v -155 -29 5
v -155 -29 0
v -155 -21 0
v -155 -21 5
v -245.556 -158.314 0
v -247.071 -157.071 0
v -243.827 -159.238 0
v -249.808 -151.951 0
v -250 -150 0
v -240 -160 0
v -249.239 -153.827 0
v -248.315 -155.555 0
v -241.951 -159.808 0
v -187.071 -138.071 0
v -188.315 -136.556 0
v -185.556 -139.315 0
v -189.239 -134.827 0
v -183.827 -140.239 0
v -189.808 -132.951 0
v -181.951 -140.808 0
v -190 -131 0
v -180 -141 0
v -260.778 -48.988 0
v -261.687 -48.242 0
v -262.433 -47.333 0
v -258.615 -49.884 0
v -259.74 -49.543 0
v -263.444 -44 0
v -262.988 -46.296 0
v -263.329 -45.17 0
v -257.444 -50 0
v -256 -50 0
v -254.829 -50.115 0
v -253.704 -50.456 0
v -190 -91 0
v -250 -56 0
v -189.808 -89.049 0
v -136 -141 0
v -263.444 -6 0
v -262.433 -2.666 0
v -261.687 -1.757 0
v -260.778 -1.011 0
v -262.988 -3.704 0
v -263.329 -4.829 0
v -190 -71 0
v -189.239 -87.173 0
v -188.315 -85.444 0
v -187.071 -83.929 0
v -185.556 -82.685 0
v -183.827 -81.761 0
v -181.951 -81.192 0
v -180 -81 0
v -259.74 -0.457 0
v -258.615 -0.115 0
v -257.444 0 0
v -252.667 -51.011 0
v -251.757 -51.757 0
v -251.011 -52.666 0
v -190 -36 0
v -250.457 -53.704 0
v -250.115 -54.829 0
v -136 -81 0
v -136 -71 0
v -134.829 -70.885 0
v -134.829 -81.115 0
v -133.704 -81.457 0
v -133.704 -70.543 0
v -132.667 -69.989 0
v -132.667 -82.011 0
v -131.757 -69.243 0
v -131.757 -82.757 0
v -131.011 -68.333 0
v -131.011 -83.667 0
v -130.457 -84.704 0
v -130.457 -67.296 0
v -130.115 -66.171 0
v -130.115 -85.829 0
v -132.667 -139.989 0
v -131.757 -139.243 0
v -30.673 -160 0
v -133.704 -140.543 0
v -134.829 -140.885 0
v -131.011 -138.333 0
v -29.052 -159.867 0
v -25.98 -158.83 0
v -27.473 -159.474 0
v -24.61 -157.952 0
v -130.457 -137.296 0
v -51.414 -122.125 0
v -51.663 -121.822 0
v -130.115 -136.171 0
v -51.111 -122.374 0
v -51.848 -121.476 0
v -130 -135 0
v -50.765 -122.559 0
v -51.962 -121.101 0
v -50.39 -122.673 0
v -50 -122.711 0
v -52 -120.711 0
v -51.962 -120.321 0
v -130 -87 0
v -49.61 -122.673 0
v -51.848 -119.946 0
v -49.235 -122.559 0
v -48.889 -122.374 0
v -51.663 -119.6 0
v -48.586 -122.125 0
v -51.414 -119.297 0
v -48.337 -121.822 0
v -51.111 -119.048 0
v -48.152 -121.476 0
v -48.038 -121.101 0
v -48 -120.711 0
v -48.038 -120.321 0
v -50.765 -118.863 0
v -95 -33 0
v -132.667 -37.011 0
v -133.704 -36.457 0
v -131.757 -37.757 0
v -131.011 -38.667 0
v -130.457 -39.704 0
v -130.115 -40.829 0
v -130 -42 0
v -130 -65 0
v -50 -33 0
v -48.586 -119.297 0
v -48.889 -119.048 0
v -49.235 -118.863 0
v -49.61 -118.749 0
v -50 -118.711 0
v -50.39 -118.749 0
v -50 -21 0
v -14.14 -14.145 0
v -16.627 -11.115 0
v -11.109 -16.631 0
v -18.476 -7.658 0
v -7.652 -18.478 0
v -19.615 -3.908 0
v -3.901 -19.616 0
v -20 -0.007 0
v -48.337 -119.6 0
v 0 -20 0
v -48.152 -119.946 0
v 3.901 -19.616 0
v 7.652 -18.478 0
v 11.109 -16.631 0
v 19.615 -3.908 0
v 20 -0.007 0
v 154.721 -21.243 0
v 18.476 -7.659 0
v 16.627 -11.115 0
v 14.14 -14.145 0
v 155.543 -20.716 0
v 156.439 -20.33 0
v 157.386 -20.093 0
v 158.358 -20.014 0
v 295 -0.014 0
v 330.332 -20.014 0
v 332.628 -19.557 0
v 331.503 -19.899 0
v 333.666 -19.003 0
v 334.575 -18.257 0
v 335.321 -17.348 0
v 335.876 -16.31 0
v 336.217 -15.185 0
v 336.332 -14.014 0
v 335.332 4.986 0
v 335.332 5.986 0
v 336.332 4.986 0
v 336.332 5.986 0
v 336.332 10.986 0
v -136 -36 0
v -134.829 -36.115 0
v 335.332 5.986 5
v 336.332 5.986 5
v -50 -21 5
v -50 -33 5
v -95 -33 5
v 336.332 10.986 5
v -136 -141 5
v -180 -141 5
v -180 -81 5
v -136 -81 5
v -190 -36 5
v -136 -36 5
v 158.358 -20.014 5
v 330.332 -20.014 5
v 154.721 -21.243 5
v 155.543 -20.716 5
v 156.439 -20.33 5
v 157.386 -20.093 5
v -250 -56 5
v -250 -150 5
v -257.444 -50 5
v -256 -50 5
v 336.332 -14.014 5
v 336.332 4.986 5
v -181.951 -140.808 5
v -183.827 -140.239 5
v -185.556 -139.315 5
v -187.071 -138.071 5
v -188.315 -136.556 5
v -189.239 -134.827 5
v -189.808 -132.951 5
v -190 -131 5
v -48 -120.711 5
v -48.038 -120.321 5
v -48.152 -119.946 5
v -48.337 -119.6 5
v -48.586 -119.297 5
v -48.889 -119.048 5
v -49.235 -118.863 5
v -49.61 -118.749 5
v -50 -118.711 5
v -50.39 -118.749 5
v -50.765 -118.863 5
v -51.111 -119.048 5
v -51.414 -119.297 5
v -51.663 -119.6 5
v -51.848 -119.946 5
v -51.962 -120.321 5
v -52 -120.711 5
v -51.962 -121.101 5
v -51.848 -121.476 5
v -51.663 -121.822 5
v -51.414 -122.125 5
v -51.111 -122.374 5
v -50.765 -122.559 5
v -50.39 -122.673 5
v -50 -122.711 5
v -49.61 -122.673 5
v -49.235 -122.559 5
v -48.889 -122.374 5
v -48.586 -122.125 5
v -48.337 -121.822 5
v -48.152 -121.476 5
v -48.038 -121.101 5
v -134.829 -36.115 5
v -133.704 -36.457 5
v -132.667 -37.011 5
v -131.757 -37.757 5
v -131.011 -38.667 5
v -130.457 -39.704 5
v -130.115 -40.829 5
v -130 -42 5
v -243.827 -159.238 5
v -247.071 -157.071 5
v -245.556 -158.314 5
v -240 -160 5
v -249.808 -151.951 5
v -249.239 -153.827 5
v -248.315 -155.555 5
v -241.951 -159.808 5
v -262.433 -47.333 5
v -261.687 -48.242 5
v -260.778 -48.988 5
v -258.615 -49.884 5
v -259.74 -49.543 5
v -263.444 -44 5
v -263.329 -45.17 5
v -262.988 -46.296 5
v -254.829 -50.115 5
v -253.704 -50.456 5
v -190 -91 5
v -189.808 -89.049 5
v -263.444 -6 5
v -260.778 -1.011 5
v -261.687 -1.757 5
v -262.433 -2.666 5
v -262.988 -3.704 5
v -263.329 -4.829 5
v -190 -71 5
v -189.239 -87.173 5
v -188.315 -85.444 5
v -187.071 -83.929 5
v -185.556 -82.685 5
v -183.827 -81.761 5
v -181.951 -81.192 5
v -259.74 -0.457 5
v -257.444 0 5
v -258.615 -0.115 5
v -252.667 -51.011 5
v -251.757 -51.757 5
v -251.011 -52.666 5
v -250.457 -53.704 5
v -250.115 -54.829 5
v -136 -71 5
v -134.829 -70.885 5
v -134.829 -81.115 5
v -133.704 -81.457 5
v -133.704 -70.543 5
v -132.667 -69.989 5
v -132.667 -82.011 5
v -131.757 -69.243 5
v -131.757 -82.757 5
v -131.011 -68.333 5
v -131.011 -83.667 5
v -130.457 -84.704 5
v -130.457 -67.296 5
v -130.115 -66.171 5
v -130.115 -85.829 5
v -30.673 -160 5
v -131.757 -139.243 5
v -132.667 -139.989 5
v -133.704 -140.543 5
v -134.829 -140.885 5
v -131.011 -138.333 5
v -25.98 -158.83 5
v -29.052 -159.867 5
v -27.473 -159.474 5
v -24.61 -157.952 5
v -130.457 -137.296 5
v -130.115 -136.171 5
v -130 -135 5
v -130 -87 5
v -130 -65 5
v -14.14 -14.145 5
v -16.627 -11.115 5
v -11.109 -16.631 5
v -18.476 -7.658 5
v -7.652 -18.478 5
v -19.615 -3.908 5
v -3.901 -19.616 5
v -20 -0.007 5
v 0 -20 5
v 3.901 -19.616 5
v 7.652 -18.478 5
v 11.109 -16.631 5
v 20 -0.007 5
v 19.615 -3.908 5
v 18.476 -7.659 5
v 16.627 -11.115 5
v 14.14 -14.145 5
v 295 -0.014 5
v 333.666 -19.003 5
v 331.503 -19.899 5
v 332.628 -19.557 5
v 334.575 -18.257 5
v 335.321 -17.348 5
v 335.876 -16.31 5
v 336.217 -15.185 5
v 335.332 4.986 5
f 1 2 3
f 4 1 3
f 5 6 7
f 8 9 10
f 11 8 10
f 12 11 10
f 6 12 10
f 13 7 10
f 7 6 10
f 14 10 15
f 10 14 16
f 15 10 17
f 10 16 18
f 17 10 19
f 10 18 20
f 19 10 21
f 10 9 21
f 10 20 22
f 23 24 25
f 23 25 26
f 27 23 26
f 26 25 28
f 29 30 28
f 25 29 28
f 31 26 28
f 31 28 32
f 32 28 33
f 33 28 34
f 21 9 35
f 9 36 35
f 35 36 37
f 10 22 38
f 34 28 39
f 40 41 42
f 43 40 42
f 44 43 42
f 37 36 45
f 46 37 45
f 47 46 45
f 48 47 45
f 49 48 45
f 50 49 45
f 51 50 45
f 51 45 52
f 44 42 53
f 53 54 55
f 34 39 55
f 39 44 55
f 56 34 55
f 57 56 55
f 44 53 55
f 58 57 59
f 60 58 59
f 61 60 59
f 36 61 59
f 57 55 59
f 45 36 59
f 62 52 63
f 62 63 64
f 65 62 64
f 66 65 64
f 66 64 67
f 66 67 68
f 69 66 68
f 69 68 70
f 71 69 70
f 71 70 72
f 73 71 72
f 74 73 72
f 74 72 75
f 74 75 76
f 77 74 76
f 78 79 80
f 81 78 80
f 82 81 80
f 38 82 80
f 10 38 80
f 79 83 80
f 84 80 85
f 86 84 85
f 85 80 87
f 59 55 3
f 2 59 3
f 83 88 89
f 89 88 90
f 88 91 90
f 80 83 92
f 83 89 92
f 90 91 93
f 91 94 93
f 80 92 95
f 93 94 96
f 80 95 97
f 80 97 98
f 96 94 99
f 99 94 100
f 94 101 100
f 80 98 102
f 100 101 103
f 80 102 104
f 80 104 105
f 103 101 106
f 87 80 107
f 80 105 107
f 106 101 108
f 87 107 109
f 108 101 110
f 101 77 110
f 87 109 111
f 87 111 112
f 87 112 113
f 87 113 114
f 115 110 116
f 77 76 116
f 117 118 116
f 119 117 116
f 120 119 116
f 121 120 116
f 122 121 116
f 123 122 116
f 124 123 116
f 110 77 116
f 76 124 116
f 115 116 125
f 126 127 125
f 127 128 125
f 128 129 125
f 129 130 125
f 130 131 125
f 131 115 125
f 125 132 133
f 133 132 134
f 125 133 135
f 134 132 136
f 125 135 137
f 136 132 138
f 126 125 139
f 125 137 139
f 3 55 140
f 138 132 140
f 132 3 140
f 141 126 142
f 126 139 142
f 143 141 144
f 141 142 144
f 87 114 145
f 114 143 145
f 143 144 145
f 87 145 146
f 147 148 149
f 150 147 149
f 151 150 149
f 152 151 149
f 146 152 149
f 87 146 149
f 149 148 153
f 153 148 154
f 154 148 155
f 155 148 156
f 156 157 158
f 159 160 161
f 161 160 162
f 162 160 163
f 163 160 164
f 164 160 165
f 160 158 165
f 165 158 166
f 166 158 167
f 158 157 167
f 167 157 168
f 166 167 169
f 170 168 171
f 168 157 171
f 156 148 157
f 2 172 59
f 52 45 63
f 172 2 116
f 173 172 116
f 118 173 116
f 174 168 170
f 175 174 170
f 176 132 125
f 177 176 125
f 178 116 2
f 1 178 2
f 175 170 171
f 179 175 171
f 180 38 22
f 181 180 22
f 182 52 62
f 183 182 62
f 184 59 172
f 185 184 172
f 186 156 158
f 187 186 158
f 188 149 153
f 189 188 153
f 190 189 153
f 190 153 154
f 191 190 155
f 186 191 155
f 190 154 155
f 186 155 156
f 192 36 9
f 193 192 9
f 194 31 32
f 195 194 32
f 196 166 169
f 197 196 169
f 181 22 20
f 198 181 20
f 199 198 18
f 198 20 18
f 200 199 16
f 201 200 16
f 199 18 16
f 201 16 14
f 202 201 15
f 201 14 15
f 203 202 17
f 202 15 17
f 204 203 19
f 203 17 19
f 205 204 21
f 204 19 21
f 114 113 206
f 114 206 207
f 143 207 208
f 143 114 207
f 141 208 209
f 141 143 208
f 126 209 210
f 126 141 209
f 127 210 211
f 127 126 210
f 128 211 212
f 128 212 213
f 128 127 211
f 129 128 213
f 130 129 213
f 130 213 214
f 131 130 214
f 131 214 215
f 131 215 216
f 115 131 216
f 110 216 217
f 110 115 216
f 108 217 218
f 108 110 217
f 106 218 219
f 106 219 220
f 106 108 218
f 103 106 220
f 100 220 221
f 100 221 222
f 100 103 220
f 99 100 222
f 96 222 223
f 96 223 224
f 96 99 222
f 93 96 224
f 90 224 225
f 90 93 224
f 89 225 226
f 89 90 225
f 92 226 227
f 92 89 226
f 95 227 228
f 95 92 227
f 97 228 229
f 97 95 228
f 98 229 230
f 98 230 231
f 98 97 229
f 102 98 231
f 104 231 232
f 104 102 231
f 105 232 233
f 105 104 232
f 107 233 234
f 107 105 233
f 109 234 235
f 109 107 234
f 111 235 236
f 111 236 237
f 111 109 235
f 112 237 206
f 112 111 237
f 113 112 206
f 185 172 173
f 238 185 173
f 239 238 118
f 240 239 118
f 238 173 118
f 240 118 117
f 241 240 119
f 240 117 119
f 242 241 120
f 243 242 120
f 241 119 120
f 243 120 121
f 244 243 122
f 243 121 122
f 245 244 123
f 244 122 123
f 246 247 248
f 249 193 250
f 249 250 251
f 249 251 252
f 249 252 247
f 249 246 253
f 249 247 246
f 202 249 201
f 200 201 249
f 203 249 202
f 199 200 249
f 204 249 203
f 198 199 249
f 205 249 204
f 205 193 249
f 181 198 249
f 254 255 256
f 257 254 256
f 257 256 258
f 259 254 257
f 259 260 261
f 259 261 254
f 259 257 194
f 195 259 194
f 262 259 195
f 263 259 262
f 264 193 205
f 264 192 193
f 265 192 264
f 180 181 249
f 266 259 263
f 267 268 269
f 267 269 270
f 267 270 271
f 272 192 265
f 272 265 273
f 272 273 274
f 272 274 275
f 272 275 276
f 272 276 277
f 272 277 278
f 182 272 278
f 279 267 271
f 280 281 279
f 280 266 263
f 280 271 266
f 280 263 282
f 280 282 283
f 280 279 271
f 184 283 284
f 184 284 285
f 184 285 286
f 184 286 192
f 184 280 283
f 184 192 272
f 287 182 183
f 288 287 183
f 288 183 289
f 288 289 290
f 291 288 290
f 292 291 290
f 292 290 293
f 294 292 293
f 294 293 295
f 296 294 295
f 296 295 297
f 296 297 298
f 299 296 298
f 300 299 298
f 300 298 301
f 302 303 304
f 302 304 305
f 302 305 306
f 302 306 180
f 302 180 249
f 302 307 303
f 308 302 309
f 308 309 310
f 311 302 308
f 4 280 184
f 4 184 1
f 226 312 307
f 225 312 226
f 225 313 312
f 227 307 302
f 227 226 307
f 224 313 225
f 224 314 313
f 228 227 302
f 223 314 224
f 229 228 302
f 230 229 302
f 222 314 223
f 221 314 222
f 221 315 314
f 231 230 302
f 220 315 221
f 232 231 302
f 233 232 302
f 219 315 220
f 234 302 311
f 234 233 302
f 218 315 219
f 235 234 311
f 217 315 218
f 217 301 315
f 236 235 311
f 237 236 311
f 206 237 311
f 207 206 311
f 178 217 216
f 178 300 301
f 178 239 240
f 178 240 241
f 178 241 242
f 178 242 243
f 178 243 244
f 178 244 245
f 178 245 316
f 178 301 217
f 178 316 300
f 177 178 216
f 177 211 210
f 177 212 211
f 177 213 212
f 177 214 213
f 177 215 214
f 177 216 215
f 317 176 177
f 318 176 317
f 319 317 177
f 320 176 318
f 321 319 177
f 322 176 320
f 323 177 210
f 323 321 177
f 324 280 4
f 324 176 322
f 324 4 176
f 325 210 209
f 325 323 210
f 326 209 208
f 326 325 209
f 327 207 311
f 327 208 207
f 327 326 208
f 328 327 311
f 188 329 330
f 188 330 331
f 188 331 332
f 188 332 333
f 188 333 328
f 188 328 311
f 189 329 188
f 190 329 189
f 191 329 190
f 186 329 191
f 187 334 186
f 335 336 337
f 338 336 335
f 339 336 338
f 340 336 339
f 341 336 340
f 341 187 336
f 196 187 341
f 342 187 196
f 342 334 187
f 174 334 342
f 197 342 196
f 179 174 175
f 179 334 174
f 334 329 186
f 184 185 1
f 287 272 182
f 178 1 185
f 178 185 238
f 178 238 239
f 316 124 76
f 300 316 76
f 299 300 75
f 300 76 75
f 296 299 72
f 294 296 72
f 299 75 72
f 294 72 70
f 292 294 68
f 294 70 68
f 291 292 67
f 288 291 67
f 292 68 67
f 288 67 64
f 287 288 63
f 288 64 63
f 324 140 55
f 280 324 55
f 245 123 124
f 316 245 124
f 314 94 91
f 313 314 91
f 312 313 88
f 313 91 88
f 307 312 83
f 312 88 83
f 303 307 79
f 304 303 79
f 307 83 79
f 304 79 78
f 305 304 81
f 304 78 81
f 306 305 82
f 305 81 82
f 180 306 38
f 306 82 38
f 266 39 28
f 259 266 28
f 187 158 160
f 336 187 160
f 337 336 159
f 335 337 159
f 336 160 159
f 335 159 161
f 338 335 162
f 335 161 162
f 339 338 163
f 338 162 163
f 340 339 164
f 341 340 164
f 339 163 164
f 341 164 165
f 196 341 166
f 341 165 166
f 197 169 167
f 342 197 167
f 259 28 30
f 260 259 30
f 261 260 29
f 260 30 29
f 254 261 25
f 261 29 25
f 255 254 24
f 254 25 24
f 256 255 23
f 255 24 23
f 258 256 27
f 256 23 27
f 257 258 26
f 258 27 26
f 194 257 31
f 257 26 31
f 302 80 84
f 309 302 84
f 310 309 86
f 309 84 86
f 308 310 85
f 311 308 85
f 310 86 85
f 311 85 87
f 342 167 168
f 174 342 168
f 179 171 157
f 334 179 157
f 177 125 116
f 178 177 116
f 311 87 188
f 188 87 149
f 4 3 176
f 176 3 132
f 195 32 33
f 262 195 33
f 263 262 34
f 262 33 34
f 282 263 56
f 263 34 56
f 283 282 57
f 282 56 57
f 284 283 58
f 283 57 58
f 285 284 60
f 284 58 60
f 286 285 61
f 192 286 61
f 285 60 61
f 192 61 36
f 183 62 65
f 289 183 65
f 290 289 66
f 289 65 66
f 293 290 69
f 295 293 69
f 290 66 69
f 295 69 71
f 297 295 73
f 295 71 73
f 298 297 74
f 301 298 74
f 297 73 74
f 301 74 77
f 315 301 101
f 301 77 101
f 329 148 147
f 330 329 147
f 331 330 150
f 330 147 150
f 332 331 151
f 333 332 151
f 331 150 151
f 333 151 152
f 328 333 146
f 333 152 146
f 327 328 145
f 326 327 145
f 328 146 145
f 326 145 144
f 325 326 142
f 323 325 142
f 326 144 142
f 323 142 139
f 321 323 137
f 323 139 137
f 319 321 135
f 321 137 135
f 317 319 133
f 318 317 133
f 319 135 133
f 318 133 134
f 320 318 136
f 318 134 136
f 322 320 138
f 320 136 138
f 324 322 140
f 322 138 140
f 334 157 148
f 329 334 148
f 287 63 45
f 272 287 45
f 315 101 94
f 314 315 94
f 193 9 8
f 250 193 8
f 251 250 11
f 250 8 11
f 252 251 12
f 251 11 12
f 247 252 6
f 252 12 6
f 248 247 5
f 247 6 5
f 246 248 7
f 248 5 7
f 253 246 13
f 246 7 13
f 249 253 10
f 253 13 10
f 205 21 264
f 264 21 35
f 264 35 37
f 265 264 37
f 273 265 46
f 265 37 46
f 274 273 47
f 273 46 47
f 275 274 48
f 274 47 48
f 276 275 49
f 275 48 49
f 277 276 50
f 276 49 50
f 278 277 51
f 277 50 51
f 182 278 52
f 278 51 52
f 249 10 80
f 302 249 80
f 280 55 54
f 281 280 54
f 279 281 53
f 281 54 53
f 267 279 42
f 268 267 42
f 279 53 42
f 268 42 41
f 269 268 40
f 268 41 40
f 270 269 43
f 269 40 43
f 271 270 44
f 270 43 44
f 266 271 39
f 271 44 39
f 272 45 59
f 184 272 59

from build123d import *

# Parameters (mm, degrees)
F0_R     = 2
F1_DEPTH = 5


with BuildPart() as f1:
    # F0 (on Top) → F1 (new body)
    with BuildSketch(Plane.XY):
        with BuildLine():
            Line((336.332237, -14.014128), (336.332237, 4.985872))
            Line((336.332237, 4.985872), (335.332237, 4.985872))
            Line((335.332237, 4.985872), (335.332237, 5.985872))
            Line((335.332237, 5.985872), (336.332237, 5.985872))
            Line((336.332237, 5.985872), (336.332237, 10.985872))
            Line((336.332237, 10.985872), (295.000411, -0.014128))
            Line((295.000411, -0.014128), (19.999999, -0.007009))
            ThreePointArc((19.999999, -0.007009), (-7.8e-05, -20), (-19.999999, -0.006852))
            Line((-19.999999, -0.006852), (-257.444166, 0.000174))
            ThreePointArc((-257.444166, 0.000174), (-261.686907, -1.75713), (-263.444321, -5.999826))
            Line((-263.444321, -5.999826), (-263.444321, -43.999671))
            ThreePointArc((-263.444321, -43.999671), (-261.686962, -48.242311), (-257.444321, -49.999671))
            Line((-257.444321, -49.999671), (-256, -49.999671))
            ThreePointArc((-256, -49.999671), (-251.757359, -51.75703), (-250, -55.999671))
            Line((-250, -55.999671), (-250, -149.999671))
            ThreePointArc((-250, -149.999671), (-247.071068, -157.070739), (-240, -159.999671))
            Line((-240, -159.999671), (-30.672852, -159.999671))
            ThreePointArc((-30.672852, -159.999671), (-27.473383, -159.474026), (-24.610271, -157.952351))
            Line((-24.610271, -157.952351), (154.720876, -21.24252))
            ThreePointArc((154.720876, -21.24252), (156.438743, -20.329515), (158.358424, -20.014128))
            Line((158.358424, -20.014128), (330.332237, -20.014128))
            ThreePointArc((330.332237, -20.014128), (334.574878, -18.256769), (336.332237, -14.014128))
        make_face()
        with Locations((-50, -120.711)):
            Circle(F0_R, mode=Mode.SUBTRACT)
        with BuildLine():
            Line((-180, -81), (-136, -81))
            ThreePointArc((-136, -81), (-131.757359, -82.757359), (-130, -87))
            Line((-130, -87), (-130, -135))
            ThreePointArc((-130, -135), (-131.757359, -139.242641), (-136, -141))
            Line((-136, -141), (-180, -141))
            ThreePointArc((-180, -141), (-187.071068, -138.071068), (-190, -131))
            Line((-190, -131), (-190, -91))
            ThreePointArc((-190, -91), (-187.071068, -83.928932), (-180, -81))
        make_face(mode=Mode.SUBTRACT)
        with BuildLine():
            Line((-190, -36), (-136, -36))
            ThreePointArc((-136, -36), (-131.757359, -37.757359), (-130, -42))
            Line((-130, -42), (-130, -65))
            ThreePointArc((-130, -65), (-131.757359, -69.242641), (-136, -71))
            Line((-136, -71), (-190, -71))
            Line((-190, -71), (-190, -36))
        make_face(mode=Mode.SUBTRACT)
        Polygon((-155, -21), (-50, -21), (-50, -33), (-95, -33), (-155, -29), (-155, -25), align=None, mode=Mode.SUBTRACT)
    extrude(amount=F1_DEPTH)


solid = f1.part
